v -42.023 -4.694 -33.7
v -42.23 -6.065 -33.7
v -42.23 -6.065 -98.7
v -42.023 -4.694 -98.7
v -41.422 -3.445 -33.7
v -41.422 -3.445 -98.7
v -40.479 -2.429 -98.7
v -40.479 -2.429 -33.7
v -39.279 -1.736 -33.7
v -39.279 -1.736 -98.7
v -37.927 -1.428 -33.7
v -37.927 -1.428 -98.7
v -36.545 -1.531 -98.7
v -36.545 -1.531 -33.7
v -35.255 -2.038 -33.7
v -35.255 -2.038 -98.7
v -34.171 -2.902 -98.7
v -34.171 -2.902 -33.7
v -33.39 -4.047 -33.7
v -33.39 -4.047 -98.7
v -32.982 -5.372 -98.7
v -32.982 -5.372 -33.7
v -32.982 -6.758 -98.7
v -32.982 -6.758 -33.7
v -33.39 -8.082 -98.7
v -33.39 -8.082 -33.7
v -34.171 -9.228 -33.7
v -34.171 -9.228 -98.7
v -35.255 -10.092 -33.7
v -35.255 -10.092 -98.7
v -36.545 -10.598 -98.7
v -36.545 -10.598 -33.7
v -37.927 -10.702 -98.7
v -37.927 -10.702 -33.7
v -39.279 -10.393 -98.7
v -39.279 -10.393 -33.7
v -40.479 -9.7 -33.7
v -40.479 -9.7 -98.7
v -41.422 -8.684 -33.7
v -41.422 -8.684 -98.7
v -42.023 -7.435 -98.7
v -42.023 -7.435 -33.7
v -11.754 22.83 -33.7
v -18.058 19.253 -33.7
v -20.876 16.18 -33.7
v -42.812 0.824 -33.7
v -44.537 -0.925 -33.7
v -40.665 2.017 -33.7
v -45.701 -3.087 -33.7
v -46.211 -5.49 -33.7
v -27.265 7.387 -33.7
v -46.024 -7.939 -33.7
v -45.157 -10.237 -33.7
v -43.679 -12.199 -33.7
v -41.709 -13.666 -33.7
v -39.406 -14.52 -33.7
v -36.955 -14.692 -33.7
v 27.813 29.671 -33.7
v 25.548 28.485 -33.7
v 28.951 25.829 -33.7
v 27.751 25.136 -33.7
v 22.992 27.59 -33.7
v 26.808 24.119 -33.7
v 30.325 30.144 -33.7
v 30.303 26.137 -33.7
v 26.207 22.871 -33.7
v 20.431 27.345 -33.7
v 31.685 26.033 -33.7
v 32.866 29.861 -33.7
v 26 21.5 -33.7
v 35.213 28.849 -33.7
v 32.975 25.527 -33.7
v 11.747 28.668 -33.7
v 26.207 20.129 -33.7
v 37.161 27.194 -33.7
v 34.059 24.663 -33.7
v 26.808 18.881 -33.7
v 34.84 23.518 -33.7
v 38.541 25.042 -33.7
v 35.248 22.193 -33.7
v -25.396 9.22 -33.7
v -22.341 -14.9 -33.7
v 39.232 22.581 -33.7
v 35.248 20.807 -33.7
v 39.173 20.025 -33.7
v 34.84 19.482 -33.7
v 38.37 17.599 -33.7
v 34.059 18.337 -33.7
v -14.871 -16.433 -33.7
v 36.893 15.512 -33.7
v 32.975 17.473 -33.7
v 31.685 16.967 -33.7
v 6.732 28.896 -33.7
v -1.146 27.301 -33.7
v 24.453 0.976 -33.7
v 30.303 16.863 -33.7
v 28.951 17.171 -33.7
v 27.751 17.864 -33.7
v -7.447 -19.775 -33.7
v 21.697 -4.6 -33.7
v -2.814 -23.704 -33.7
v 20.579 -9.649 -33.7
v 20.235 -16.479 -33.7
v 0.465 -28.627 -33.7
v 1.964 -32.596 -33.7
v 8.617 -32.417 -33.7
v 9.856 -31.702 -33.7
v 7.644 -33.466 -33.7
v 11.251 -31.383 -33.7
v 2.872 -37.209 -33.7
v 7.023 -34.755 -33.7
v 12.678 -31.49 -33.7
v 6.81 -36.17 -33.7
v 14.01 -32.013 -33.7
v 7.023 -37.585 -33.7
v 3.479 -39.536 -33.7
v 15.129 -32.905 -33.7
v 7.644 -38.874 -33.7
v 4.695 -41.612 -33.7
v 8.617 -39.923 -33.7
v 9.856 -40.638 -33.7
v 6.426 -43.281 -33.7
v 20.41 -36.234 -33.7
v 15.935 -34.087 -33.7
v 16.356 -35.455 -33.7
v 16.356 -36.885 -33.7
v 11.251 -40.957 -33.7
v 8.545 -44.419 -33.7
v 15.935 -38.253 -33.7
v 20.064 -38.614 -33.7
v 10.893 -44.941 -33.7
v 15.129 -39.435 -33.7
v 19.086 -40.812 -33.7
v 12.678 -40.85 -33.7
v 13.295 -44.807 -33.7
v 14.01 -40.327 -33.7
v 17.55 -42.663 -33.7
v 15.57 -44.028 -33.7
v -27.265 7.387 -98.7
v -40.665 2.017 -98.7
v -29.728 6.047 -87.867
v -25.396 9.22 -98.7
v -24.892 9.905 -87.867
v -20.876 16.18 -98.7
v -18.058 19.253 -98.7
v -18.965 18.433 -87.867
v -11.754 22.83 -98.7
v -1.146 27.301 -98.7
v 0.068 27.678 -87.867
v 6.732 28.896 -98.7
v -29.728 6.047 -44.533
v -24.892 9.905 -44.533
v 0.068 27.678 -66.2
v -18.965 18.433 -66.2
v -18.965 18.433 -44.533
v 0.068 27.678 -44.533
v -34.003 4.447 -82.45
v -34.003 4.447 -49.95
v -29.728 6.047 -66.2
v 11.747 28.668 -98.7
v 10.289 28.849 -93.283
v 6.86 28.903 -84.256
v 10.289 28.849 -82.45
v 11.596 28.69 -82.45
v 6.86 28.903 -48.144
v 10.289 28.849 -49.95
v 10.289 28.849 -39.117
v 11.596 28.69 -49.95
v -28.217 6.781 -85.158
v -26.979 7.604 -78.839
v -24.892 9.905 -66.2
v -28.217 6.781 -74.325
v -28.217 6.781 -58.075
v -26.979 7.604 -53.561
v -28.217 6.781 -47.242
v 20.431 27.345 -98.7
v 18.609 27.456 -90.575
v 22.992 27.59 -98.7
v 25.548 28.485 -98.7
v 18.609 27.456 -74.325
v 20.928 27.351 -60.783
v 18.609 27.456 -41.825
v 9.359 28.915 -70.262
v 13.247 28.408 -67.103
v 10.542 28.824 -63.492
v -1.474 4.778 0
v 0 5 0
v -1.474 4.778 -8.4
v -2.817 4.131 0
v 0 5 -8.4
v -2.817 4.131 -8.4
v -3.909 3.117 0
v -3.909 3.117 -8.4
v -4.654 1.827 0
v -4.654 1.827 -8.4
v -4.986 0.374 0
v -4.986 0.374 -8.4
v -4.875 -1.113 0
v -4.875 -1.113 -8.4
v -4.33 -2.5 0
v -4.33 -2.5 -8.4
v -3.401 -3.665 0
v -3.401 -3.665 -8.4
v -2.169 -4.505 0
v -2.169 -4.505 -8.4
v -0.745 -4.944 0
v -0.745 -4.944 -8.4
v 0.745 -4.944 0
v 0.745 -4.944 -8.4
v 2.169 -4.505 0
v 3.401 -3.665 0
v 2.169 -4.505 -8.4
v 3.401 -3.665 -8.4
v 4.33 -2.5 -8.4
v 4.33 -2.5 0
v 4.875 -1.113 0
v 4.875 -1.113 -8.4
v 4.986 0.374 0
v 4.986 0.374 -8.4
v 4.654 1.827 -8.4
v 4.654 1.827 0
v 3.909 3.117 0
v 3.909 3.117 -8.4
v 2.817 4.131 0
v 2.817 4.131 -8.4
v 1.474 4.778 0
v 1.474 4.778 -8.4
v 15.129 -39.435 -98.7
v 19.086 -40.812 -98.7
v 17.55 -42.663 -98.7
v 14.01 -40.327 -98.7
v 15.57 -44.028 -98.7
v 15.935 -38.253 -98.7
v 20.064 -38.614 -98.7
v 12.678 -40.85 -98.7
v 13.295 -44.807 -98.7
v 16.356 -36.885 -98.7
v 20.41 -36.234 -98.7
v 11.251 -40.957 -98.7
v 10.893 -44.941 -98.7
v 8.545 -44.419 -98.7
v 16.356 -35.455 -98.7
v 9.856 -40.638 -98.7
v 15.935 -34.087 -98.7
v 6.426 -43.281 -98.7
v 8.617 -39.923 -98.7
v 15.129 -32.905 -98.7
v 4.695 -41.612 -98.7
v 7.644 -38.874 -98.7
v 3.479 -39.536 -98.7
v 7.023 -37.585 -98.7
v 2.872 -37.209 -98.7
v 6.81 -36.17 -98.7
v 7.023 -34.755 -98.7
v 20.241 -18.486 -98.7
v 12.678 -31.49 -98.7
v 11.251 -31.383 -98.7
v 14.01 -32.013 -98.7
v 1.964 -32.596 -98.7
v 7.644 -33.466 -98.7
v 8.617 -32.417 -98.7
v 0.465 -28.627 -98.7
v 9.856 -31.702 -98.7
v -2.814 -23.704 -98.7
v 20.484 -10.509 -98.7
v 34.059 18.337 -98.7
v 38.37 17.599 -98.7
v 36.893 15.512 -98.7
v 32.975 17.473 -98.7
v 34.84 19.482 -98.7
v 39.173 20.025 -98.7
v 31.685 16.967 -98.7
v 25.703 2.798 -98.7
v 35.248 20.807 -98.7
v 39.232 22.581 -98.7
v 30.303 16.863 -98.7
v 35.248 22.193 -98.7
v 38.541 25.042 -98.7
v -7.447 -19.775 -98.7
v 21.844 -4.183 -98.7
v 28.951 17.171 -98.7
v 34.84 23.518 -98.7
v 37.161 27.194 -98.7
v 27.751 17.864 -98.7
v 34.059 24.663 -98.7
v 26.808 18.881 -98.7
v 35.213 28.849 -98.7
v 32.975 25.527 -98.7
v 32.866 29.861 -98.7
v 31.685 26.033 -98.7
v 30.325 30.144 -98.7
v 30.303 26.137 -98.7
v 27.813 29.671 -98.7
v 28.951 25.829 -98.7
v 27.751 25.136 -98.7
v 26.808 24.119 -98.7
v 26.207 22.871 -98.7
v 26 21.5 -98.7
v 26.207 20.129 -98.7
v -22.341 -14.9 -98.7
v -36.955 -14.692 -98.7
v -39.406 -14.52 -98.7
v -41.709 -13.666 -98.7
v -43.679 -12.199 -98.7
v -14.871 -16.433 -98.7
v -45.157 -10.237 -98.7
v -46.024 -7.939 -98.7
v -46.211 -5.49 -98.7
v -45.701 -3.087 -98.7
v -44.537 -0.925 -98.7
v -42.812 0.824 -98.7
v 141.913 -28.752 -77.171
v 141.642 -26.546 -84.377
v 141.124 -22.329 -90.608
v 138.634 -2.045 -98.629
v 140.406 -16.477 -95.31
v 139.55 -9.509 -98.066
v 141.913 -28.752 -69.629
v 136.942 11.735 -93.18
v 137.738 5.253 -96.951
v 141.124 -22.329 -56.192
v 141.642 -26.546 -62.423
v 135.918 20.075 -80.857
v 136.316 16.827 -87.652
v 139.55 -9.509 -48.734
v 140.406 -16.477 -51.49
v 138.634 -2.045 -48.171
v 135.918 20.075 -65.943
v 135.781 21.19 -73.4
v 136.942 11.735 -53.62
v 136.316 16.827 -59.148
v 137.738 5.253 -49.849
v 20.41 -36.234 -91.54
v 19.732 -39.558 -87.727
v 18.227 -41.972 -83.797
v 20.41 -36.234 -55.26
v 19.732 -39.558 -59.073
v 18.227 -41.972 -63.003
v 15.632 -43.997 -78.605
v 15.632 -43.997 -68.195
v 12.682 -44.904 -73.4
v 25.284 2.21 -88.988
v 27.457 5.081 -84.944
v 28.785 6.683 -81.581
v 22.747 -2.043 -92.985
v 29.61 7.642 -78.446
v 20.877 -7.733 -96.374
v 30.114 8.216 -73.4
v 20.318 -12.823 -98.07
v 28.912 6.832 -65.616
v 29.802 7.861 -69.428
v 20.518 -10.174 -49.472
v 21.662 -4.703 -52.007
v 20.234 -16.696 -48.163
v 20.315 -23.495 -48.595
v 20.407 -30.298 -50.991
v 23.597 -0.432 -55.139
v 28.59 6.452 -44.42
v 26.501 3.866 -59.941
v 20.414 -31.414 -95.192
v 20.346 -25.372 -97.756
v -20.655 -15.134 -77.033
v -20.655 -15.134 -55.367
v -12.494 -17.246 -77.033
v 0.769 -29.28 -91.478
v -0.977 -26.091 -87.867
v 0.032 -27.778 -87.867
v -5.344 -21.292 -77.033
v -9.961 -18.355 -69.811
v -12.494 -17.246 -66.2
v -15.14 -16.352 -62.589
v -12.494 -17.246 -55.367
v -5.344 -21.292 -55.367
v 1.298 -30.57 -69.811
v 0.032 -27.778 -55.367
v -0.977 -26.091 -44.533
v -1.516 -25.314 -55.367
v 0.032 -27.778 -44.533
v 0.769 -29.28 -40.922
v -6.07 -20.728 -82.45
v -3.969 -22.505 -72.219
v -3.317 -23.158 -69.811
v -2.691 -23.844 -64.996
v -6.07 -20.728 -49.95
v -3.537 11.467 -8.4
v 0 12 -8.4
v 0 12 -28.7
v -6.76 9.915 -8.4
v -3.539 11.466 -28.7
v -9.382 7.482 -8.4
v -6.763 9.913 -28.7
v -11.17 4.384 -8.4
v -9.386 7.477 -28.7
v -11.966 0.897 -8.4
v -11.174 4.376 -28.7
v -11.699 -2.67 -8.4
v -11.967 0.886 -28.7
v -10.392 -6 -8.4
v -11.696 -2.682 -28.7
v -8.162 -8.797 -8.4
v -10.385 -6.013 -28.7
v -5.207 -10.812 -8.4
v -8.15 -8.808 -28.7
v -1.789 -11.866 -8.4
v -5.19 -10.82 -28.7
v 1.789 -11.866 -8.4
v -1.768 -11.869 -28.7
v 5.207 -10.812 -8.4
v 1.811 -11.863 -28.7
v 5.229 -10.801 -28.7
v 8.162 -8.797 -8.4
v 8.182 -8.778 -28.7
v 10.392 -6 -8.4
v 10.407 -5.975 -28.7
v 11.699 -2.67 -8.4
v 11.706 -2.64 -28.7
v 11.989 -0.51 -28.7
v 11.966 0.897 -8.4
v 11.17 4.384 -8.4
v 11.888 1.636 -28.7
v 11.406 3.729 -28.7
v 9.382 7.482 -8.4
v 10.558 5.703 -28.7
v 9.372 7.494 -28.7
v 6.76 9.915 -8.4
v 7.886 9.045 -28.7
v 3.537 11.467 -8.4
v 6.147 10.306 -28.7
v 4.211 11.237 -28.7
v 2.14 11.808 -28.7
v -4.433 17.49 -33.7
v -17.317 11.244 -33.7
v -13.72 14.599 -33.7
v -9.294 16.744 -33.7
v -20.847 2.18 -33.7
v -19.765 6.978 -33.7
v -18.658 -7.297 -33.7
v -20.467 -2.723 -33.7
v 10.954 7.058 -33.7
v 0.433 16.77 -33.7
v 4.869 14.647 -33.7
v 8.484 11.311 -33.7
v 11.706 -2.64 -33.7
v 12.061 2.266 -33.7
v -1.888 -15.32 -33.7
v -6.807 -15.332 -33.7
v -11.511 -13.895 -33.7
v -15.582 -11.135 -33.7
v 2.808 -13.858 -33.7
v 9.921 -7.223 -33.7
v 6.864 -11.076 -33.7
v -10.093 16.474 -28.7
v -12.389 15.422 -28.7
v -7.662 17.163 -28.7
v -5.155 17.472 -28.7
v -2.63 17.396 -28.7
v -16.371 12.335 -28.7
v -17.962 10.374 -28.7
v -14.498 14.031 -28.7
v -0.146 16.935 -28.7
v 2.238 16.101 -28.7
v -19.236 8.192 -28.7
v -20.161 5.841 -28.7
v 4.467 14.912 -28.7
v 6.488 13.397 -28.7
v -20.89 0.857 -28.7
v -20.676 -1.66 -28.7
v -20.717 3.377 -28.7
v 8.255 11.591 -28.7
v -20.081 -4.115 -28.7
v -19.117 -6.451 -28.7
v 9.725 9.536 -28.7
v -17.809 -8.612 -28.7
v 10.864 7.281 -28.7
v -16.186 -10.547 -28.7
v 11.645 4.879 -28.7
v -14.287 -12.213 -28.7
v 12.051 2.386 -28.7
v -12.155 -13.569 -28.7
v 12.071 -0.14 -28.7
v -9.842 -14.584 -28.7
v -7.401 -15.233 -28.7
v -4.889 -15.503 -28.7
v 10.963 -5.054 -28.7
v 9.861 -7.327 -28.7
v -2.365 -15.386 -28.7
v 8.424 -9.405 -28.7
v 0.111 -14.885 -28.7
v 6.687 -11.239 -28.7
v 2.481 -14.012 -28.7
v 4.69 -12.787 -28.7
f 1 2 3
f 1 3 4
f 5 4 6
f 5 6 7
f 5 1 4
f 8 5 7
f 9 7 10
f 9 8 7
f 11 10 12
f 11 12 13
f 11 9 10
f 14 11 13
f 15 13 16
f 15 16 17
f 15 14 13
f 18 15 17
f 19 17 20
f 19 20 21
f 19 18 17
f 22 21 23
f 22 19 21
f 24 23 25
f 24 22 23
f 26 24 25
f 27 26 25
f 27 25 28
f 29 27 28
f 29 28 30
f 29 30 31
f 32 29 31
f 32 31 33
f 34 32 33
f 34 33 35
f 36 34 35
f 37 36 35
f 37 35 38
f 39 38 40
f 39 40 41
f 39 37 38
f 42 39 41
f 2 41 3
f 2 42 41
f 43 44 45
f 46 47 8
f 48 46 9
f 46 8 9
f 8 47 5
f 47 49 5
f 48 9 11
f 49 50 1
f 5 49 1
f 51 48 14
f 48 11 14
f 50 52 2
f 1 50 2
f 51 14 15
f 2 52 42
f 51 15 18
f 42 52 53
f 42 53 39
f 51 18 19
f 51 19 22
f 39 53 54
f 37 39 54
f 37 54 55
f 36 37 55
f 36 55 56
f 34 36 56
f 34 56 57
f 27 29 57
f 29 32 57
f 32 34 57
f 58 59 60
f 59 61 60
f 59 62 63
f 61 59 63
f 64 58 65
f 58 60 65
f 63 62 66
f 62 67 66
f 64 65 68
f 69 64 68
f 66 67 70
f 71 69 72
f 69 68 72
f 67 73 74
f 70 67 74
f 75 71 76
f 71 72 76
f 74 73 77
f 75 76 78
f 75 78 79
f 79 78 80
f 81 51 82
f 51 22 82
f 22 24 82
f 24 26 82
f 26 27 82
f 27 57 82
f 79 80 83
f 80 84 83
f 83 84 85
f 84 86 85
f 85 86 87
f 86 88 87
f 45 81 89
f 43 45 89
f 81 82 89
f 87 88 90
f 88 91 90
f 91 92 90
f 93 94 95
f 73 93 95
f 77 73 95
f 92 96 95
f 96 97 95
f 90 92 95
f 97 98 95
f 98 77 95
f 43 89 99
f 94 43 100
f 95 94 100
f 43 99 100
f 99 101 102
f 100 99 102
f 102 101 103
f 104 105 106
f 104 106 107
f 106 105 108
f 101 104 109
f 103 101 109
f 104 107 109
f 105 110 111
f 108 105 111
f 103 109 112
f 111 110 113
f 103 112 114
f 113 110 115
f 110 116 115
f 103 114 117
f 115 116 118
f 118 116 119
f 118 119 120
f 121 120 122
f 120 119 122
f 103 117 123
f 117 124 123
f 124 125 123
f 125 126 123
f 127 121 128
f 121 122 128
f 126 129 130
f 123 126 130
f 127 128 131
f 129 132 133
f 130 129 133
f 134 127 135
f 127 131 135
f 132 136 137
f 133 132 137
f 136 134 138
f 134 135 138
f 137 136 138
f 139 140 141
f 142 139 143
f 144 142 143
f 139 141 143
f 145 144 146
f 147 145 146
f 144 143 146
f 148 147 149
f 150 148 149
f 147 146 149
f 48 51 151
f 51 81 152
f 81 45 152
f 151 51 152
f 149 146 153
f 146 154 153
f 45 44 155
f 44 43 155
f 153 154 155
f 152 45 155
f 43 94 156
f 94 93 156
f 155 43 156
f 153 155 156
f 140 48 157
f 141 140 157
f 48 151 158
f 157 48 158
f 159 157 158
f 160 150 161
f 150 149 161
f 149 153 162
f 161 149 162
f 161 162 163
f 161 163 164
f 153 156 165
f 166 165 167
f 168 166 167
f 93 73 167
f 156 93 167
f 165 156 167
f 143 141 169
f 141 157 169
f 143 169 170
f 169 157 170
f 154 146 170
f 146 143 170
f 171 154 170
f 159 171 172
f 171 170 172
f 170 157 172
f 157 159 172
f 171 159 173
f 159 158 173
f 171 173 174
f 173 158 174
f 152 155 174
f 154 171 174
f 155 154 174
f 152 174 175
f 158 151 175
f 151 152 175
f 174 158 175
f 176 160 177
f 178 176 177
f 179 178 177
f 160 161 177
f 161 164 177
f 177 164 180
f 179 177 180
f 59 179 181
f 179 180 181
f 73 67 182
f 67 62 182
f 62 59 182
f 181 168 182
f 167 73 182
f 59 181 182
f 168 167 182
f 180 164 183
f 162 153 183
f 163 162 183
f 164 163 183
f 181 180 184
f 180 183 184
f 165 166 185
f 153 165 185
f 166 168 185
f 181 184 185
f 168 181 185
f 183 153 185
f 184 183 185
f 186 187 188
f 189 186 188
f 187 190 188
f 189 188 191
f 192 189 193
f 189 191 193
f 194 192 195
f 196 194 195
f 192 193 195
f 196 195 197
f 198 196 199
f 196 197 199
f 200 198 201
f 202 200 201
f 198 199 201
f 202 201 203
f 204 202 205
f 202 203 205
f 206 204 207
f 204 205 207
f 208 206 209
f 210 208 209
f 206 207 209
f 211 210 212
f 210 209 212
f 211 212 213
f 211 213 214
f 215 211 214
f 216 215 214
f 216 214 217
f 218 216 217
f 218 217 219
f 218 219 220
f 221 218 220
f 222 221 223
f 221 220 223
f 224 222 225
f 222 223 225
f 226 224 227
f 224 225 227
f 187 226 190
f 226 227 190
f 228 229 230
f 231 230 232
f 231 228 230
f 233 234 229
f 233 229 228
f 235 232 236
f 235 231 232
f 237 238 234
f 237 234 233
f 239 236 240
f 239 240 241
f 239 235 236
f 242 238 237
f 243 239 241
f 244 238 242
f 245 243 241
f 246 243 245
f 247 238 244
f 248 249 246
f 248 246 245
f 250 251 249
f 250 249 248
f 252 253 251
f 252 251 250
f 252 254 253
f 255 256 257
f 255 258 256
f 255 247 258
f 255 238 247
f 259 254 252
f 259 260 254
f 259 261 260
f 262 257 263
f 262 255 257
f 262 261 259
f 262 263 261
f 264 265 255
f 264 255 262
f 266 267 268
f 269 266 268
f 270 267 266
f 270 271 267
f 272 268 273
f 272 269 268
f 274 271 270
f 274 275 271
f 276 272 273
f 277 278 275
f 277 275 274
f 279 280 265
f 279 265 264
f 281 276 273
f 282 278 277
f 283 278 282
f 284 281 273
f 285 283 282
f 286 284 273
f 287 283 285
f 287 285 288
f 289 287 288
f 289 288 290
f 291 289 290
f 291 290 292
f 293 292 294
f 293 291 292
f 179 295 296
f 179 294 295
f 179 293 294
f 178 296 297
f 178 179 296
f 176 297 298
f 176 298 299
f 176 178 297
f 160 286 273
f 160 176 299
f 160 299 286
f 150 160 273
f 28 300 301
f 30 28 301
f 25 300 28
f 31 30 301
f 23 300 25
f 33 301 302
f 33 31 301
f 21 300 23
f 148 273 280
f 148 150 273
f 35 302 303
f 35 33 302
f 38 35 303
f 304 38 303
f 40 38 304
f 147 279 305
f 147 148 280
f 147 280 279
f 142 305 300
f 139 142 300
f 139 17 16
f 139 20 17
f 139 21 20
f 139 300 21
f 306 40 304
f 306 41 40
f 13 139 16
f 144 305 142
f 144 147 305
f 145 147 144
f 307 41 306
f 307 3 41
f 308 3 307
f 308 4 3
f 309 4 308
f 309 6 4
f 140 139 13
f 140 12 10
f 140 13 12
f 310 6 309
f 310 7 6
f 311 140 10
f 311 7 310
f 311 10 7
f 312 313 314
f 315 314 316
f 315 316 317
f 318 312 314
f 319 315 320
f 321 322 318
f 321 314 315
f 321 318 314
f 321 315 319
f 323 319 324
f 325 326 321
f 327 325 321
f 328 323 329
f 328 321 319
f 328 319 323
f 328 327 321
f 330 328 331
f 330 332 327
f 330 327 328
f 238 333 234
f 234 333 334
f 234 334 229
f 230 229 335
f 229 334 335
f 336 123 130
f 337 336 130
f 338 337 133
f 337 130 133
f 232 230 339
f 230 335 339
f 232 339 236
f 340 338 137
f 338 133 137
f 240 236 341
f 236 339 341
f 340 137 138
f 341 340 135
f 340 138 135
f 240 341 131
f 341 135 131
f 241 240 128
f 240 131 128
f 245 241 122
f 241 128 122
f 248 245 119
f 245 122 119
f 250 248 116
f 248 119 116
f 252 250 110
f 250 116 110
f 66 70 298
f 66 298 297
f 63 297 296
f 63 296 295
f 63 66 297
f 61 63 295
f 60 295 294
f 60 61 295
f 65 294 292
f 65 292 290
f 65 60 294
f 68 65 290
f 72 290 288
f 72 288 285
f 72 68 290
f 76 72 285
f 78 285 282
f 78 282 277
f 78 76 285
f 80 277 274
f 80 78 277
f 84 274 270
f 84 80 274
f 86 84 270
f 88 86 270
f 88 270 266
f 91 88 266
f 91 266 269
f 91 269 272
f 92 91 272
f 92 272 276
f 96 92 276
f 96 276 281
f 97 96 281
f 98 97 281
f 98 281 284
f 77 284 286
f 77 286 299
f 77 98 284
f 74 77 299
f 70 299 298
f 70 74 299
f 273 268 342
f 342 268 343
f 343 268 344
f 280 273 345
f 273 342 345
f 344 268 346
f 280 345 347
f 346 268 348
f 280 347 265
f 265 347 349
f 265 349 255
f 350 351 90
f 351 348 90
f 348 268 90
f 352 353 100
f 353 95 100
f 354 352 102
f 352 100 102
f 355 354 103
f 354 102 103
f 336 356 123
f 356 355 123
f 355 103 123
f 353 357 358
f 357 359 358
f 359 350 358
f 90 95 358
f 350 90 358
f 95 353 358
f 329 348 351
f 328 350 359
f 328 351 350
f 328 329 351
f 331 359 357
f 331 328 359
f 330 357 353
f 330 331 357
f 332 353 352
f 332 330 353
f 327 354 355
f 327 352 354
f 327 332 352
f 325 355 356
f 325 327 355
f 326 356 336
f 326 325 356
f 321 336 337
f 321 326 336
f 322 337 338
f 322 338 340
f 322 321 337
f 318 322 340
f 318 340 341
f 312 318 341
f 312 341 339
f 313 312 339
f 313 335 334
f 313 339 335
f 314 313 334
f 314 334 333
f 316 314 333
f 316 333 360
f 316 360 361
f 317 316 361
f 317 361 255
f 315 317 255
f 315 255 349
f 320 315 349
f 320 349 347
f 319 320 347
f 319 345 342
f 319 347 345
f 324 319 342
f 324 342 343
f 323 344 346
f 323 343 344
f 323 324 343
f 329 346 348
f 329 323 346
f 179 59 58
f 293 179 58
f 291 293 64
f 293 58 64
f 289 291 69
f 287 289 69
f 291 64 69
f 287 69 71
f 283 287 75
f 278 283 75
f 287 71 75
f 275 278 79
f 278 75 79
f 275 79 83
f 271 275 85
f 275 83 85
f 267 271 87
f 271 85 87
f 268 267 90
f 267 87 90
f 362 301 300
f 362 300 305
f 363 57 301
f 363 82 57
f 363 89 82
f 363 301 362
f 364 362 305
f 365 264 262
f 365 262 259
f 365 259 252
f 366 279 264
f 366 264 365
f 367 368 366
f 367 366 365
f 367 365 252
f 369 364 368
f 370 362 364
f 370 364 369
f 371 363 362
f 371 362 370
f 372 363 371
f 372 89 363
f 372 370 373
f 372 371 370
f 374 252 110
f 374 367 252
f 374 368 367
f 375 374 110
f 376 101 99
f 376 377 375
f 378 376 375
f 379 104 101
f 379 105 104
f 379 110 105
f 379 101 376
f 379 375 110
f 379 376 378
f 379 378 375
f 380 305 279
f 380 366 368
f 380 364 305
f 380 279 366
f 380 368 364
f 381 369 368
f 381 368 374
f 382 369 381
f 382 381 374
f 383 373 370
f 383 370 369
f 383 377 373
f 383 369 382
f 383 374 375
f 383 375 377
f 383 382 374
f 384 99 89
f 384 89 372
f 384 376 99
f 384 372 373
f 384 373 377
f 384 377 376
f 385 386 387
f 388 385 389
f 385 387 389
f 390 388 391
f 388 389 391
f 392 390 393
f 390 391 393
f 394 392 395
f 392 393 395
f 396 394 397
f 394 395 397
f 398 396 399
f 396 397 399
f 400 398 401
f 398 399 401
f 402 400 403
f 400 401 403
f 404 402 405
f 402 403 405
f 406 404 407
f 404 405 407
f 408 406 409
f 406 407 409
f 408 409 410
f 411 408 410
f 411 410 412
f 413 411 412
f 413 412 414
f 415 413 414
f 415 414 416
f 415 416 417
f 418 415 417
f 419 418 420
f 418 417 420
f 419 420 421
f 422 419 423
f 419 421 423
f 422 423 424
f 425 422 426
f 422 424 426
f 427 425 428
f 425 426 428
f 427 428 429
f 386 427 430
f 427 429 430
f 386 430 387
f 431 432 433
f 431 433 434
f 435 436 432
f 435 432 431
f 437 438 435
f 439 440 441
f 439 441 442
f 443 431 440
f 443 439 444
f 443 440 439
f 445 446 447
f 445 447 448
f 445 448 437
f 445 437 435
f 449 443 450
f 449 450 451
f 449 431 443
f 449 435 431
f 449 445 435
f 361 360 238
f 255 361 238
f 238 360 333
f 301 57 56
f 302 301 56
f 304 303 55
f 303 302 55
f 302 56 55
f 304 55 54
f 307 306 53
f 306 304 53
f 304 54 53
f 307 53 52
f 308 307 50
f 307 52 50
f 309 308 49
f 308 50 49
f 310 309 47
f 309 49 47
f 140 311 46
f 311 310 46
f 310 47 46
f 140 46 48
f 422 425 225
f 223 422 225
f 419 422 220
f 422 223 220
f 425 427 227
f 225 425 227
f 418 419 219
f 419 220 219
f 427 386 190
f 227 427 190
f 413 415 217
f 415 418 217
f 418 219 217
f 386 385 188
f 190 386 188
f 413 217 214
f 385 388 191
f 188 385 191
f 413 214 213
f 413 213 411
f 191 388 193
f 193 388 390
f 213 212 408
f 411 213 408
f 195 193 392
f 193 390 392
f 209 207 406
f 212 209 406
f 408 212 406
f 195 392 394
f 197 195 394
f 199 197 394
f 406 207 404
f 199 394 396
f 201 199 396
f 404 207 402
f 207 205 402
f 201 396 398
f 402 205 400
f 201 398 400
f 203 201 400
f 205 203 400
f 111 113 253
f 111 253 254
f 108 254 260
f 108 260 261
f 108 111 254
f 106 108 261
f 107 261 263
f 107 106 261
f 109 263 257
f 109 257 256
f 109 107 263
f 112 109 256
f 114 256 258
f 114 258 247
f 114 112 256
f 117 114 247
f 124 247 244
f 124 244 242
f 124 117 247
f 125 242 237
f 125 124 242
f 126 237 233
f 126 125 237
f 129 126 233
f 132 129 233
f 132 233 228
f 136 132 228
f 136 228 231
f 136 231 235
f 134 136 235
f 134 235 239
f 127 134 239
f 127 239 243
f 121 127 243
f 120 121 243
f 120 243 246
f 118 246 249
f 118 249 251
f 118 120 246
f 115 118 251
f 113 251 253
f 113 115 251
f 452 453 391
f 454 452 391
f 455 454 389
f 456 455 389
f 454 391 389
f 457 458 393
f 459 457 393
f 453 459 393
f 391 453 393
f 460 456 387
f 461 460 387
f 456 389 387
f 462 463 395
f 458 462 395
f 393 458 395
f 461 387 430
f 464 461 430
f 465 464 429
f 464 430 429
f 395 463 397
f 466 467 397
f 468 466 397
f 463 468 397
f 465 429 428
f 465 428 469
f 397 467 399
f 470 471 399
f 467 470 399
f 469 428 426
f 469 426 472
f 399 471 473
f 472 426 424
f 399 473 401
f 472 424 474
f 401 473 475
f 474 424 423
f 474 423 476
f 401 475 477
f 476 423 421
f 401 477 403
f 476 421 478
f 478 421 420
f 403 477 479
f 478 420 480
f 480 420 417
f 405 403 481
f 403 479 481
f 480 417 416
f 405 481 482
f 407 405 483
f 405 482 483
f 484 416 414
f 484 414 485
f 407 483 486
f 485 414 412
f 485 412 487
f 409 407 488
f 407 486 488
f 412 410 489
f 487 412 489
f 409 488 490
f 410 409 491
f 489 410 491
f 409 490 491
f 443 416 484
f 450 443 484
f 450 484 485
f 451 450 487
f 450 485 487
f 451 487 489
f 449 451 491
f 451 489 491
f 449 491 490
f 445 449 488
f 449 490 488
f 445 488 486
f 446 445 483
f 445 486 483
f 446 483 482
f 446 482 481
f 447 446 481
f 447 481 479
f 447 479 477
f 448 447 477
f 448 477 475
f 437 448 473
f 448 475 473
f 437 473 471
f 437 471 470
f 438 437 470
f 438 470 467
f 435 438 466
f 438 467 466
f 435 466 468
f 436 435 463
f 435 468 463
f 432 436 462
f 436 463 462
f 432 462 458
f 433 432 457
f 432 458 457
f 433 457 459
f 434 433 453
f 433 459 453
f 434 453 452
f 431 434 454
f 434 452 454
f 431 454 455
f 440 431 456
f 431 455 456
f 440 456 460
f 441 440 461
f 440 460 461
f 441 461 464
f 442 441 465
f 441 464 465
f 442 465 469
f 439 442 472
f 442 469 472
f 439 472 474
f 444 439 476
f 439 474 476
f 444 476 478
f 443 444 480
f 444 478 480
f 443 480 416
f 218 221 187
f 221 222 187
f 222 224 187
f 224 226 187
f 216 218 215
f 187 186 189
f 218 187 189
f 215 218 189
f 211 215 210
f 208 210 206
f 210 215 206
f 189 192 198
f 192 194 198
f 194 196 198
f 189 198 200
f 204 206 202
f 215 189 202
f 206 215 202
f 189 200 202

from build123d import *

# Parameters (mm, degrees)
SKETCH2_R           = 16.500244437805573
BOSS_EXTRUDE1_DEPTH = 5
SKETCH3_R           = 16.500244437805573
SKETCH3_R_2         = 8.650000000000004
SKETCH3_R_3         = 4.650000000000003
SKETCH3_R_4         = 8.799999999999999
SKETCH3_R_5         = 4.8
SKETCH3_R_6         = 8.650000000000006
BOSS_EXTRUDE2_DEPTH = 65
BOSS_EXTRUDE4_REACH = 218.511
SKETCH7_R           = 25.3


with BuildPart() as part:
    # Sketch1 → Revolve1 (revolve)
    with BuildSketch(Plane(origin=(0, 0, 0), x_dir=(0, 0, -1), z_dir=(1, 0, 0))):
        Polygon((0, 0), (0, 5), (8.4, 5), (8.4, 11.999999999999998), (28.7, 11.999999999999998), (28.7, -4.1e-16), align=None)
    revolve(axis=Axis((0, -4.1e-16, -28.7), (0, 1e-17, 1)))

    # Sketch2 → Boss-Extrude1 (add)
    with BuildSketch(Plane(origin=(0, -4.1e-16, -28.7), x_dir=(-1, 0, 0), z_dir=(0, -1e-17, -1))):
        with Locations(Location((4.39, 0.9900000000000004, 0), (0, 0, 192.708331136))):
            Circle(SKETCH2_R)
    extrude(amount=BOSS_EXTRUDE1_DEPTH)


with BuildPart() as body_2:
    # Sketch3 → Boss-Extrude2 (new body)
    # profile 1 of 5: a face of its own
    with BuildSketch(Plane(origin=(0, -4.8e-16, -33.7), x_dir=(-1, 0, 0), z_dir=(0, -1e-17, -1))):
        with BuildLine():
            ThreePointArc((-25.548245523810184, 28.48531325458474), (-22.93790961479827, 25.4174177579726), (-22, 21.5))
            ThreePointArc((-22, 21.499999999999996), (-27.423334508646363, 13.474345521584695), (-36.892746776163605, 15.512461884154803))
            add(Edge.make_bspline(
                [(-36.892746776163605, 15.512461884154803), (-16.660003911323148, -5.582667340688575), (-20.638424671102047, -4.786111490176385), (-20.409767392881168, -36.23398305389149)],
                knots=[0, 0, 0, 0, 1, 1, 1, 1], degree=3))
            ThreePointArc((-20.40976739288117, -36.23398305389149), (-11.641991738352868, -27.370058151971847), (-2.8100000000000023, -36.17))
            ThreePointArc((-2.8100000000000023, -36.17), (-2.8254093652131864, -36.69054527105313), (-2.8715834952763153, -37.20926752569907))
            add(Edge.make_bspline(
                [(36.95543055776123, -14.692174435160824), (22.19539798135658, -13.623643748956997), (-0.23803416271377587, -15.065738179690955), (-2.871583495276305, -37.20926752569907)],
                knots=[0, 0, 0, 0, 1, 1, 1, 1], degree=3))
            ThreePointArc((36.955430557761225, -14.692174435160826), (29.135584806707534, -4.190091767683555), (40.66475868053767, 2.0165077611882465))
            add(Edge.make_bspline(
                [(40.66475868053767, 2.016507761188239), (29.808956582353794, 6.160357801691806), (26.322476580478053, 5.890198418661211), (19.642162970423723, 19.806043738904282), (11.059797634796585, 22.991473655490648), (1.6689029742780697, 27.530132896770162), (-10.611608742348706, 30.664265995063133), (-20.53785946879496, 25.961417581018228), (-25.548245523810188, 28.485313254584735)],
                knots=[0, 0, 0, 0, 0.235357900246048, 0.3739613729049905, 0.5182480867569615, 0.593954255967096, 0.794427618619775, 1, 1, 1, 1], degree=3))
        make_face()
        with Locations(Location((4.39, 0.9900000000000004, 0), (0, 0, 192.708331136))):
            Circle(SKETCH3_R, mode=Mode.SUBTRACT)
    # profile 2 of 5: a face of its own
    with BuildSketch(Plane(origin=(0, -4.8e-16, -33.7), x_dir=(-1, 0, 0), z_dir=(0, -1e-17, -1))):
        with Locations((-30.650000000000002, 21.5)):
            Circle(SKETCH3_R_2)
        with Locations((-30.650000000000002, 21.5)):
            Circle(SKETCH3_R_3, mode=Mode.SUBTRACT)
    # profile 3 of 5: a face of its own
    with BuildSketch(Plane(origin=(0, -4.8e-16, -33.7), x_dir=(-1, 0, 0), z_dir=(0, -1e-17, -1))):
        with Locations((-11.610000000000001, -36.17)):
            Circle(SKETCH3_R_4)
        with Locations((-11.610000000000001, -36.17)):
            Circle(SKETCH3_R_5, mode=Mode.SUBTRACT)
    # profile 4 of 5: a face of its own
    with BuildSketch(Plane(origin=(0, -4.8e-16, -33.7), x_dir=(-1, 0, 0), z_dir=(0, -1e-17, -1))):
        with Locations((37.58, -6.064752281827791)):
            Circle(SKETCH3_R_6)
        with Locations((37.58, -6.064752281827791)):
            Circle(SKETCH3_R_3, mode=Mode.SUBTRACT)
    # profile 5 of 5: a face of its own
    with BuildSketch(Plane(origin=(0, -4.8e-16, -33.7), x_dir=(-1, 0, 0), z_dir=(0, -1e-17, -1))):
        with Locations(Location((4.39, 0.9900000000000004, 0), (0, 0, 192.708331136))):
            Circle(SKETCH3_R)
    extrude(amount=BOSS_EXTRUDE2_DEPTH)

    # Sketch7 → Boss-Extrude4 (add, up to next)
    with BuildSketch(Plane(origin=(136.32727872538024, 16.73888505738423, 0), x_dir=(0.12186934340515132, -0.9925461516413215, 0), z_dir=(0.9925461516413217, 0.12186934340515133, 0)), mode=Mode.PRIVATE) as boss_extrude4_sk1:
        with Locations(Location((20.8152973818004, 73.4, 0), (0, 0, 180))):
            Circle(SKETCH7_R)
    boss_extrude4_tool1 = extrude(boss_extrude4_sk1.sketch, amount=-BOSS_EXTRUDE4_REACH, mode=Mode.PRIVATE) - body_2.part
    add(boss_extrude4_tool1.solids().sort_by_distance((138.864025, -3.921258, -73.4))[0])


solid = Compound([part.part, body_2.part])
